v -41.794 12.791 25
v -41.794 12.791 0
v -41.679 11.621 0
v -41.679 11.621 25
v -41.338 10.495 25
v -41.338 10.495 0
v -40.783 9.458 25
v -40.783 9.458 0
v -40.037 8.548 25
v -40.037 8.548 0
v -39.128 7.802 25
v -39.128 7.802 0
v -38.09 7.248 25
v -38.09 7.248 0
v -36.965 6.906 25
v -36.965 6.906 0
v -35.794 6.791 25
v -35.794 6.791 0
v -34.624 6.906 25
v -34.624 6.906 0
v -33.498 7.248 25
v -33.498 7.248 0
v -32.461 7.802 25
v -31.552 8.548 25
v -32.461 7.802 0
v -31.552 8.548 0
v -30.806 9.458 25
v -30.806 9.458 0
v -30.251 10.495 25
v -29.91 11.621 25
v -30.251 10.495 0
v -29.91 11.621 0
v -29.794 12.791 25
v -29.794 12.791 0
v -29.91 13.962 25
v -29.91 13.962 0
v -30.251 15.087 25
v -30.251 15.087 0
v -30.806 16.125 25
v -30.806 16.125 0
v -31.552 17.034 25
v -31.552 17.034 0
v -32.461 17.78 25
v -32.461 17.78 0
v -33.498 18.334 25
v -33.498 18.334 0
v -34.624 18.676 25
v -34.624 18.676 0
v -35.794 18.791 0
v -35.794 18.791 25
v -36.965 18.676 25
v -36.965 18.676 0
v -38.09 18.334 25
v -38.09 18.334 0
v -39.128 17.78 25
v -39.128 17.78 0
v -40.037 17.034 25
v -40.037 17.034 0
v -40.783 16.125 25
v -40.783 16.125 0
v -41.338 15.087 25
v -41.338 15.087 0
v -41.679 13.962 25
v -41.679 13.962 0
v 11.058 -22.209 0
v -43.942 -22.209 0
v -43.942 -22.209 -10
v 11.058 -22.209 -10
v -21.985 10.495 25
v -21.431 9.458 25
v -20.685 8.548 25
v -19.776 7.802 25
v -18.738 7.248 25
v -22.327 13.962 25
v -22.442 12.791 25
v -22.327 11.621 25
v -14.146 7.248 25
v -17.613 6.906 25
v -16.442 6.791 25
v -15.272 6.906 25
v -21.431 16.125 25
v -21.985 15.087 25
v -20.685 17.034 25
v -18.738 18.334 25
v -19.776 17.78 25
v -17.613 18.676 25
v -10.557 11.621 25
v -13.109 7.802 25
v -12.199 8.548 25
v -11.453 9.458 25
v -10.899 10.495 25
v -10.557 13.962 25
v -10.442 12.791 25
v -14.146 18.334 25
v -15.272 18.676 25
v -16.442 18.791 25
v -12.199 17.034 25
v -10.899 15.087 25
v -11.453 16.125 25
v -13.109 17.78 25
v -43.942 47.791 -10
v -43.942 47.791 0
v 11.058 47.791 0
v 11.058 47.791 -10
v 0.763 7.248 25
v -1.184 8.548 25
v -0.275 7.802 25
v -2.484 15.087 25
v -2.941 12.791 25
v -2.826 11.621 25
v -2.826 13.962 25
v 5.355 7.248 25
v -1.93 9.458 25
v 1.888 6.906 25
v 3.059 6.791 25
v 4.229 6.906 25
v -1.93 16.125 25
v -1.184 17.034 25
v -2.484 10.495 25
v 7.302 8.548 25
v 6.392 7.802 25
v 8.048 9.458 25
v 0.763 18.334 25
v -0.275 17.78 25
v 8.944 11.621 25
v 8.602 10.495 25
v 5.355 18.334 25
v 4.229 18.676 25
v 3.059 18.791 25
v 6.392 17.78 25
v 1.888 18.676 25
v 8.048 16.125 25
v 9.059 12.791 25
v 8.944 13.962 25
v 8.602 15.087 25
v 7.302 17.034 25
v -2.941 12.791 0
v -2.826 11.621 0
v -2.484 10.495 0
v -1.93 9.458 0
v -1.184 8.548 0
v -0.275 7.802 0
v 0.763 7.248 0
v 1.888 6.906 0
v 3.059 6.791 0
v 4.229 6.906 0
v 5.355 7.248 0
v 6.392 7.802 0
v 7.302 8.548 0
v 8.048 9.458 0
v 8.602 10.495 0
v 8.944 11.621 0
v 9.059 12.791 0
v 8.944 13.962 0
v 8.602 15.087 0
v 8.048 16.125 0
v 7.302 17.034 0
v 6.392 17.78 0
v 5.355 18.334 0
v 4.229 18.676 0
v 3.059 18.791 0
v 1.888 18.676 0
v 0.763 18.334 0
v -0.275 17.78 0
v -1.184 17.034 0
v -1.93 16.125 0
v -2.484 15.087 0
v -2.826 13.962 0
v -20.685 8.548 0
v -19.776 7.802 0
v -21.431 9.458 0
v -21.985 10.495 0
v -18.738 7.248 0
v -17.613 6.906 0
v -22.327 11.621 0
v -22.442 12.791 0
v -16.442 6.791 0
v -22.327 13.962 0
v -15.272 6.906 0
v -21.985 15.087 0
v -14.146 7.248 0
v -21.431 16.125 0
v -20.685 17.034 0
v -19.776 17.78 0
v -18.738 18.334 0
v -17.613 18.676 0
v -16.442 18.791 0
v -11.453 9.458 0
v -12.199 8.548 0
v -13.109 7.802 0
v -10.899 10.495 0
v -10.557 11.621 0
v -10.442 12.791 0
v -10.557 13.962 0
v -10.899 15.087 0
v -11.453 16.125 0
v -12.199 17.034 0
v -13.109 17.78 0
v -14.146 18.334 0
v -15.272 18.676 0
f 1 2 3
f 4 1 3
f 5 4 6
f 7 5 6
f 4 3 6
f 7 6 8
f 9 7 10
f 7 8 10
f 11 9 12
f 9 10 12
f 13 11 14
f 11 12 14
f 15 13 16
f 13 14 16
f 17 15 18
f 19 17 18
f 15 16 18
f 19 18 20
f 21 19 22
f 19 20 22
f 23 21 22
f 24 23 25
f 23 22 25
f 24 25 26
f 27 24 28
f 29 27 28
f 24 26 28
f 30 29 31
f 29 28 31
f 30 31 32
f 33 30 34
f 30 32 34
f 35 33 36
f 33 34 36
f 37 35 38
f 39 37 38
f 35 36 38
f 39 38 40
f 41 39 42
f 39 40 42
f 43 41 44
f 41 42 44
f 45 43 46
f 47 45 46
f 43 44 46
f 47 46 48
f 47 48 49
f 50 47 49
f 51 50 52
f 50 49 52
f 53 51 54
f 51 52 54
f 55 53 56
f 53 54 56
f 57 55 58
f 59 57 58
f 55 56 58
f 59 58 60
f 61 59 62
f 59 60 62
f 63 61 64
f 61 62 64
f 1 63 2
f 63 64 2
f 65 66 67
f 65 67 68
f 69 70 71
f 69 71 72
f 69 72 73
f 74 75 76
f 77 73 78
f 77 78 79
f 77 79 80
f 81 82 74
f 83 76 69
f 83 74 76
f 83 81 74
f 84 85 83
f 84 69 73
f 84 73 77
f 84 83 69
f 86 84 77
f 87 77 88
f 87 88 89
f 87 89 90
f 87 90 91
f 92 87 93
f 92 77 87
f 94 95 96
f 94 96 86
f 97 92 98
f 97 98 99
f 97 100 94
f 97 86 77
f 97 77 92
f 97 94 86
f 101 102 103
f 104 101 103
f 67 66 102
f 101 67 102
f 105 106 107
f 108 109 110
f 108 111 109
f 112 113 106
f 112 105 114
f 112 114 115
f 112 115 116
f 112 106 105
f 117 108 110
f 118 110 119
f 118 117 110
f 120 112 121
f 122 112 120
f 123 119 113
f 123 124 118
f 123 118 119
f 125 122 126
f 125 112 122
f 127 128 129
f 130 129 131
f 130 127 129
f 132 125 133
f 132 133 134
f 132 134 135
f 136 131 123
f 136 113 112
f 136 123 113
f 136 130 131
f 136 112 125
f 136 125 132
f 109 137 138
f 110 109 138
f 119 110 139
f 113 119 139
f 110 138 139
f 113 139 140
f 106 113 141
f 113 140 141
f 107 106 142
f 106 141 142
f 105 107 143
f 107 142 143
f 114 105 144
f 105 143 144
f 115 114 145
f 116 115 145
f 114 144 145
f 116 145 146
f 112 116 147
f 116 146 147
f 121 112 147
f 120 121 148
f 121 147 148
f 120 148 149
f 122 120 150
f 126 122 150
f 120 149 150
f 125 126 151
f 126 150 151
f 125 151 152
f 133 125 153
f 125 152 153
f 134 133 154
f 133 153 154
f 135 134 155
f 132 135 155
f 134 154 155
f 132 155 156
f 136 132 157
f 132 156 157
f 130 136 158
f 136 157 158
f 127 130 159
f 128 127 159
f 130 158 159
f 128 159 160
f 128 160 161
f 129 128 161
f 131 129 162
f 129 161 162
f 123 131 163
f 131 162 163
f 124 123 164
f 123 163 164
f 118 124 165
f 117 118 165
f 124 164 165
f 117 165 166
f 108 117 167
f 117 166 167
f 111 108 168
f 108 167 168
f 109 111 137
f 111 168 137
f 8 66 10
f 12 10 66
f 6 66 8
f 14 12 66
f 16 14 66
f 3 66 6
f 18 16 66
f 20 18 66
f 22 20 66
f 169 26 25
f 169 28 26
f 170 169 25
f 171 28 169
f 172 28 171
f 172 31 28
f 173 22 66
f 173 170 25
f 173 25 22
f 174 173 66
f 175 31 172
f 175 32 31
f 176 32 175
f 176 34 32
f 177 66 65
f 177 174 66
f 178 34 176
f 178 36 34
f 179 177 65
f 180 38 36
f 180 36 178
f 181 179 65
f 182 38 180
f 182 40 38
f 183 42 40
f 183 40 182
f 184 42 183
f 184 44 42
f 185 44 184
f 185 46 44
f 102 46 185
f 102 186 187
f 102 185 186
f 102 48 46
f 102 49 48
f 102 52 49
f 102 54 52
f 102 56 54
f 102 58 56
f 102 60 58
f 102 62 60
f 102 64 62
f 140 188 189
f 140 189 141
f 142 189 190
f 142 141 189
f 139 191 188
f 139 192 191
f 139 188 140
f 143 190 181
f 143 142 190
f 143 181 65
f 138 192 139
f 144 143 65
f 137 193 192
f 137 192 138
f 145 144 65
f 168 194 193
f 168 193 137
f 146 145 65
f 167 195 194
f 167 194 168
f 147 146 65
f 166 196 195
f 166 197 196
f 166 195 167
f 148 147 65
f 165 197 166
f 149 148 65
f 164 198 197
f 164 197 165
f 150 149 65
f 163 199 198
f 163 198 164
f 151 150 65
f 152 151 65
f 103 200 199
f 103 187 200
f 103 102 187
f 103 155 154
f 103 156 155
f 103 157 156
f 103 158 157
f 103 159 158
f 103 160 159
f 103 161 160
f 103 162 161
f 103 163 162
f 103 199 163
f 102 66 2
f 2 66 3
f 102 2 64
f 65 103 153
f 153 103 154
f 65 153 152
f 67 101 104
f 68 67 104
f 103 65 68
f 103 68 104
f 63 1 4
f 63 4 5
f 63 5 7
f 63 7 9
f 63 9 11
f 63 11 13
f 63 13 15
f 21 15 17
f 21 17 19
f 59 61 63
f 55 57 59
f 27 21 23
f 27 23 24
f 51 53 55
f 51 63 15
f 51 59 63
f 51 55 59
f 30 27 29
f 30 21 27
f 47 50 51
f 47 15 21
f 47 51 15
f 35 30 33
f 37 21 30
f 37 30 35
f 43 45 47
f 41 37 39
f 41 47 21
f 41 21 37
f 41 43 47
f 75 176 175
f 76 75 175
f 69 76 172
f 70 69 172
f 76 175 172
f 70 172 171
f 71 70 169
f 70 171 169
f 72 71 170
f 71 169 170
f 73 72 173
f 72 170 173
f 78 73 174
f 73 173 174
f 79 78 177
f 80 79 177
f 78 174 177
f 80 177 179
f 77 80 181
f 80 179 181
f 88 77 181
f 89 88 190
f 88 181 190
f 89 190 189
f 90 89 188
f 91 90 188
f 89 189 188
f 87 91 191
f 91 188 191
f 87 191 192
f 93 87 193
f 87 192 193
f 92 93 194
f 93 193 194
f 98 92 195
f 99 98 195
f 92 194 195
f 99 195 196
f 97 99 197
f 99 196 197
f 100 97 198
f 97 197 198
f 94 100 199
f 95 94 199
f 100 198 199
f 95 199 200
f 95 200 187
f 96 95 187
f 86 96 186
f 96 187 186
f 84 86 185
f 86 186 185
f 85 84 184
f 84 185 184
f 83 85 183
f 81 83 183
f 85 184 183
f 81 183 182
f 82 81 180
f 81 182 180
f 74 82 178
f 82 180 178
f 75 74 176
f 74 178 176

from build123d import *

# Parameters (mm, degrees)
F0_W     = 55
F0_H     = 70
F1_DEPTH = 10
F3_DEPTH = 25


with BuildPart() as f1:
    # F0 (on Top) → F1 (new body)
    with BuildSketch(Plane.XY):
        with Locations((-16.4421387017, 12.7911348291)):
            Rectangle(F0_W, F0_H)
    extrude(amount=-F1_DEPTH)

    # F2 (on face) → F3 (join)
    with BuildSketch(Plane.XY):
        with BuildLine():
            Line((-41.7943287017, 12.7911348291), (-29.7943287017, 12.7911348291))
            ThreePointArc((-29.7943287017, 12.7911348291), (-35.7943287017, 18.7911348291), (-41.7943287017, 12.7911348291))
        make_face()
        with BuildLine():
            ThreePointArc((-41.7943287017, 12.7911348291), (-35.7943287017, 6.7911348291), (-29.7943287017, 12.7911348291))
            Line((-29.7943287017, 12.7911348291), (-41.7943287017, 12.7911348291))
        make_face()
        with BuildLine():
            Line((-22.4421387017, 12.7911348291), (-10.4421387017, 12.7911348291))
            ThreePointArc((-10.4421387017, 12.7911348291), (-16.4421387017, 18.7911348291), (-22.4421387017, 12.7911348291))
        make_face()
        with BuildLine():
            ThreePointArc((-22.4421387017, 12.7911348291), (-16.4421387017, 6.7911348291), (-10.4421387017, 12.7911348291))
            Line((-10.4421387017, 12.7911348291), (-22.4421387017, 12.7911348291))
        make_face()
        with BuildLine():
            Line((-2.9411387017, 12.7911348291), (9.0588612983, 12.7911348291))
            ThreePointArc((9.0588612983, 12.7911348291), (3.0588612983, 18.7911348291), (-2.9411387017, 12.7911348291))
        make_face()
        with BuildLine():
            ThreePointArc((-2.9411387017, 12.7911348291), (3.0588612983, 6.7911348291), (9.0588612983, 12.7911348291))
            Line((9.0588612983, 12.7911348291), (-2.9411387017, 12.7911348291))
        make_face()
    extrude(amount=F3_DEPTH)


solid = f1.part
